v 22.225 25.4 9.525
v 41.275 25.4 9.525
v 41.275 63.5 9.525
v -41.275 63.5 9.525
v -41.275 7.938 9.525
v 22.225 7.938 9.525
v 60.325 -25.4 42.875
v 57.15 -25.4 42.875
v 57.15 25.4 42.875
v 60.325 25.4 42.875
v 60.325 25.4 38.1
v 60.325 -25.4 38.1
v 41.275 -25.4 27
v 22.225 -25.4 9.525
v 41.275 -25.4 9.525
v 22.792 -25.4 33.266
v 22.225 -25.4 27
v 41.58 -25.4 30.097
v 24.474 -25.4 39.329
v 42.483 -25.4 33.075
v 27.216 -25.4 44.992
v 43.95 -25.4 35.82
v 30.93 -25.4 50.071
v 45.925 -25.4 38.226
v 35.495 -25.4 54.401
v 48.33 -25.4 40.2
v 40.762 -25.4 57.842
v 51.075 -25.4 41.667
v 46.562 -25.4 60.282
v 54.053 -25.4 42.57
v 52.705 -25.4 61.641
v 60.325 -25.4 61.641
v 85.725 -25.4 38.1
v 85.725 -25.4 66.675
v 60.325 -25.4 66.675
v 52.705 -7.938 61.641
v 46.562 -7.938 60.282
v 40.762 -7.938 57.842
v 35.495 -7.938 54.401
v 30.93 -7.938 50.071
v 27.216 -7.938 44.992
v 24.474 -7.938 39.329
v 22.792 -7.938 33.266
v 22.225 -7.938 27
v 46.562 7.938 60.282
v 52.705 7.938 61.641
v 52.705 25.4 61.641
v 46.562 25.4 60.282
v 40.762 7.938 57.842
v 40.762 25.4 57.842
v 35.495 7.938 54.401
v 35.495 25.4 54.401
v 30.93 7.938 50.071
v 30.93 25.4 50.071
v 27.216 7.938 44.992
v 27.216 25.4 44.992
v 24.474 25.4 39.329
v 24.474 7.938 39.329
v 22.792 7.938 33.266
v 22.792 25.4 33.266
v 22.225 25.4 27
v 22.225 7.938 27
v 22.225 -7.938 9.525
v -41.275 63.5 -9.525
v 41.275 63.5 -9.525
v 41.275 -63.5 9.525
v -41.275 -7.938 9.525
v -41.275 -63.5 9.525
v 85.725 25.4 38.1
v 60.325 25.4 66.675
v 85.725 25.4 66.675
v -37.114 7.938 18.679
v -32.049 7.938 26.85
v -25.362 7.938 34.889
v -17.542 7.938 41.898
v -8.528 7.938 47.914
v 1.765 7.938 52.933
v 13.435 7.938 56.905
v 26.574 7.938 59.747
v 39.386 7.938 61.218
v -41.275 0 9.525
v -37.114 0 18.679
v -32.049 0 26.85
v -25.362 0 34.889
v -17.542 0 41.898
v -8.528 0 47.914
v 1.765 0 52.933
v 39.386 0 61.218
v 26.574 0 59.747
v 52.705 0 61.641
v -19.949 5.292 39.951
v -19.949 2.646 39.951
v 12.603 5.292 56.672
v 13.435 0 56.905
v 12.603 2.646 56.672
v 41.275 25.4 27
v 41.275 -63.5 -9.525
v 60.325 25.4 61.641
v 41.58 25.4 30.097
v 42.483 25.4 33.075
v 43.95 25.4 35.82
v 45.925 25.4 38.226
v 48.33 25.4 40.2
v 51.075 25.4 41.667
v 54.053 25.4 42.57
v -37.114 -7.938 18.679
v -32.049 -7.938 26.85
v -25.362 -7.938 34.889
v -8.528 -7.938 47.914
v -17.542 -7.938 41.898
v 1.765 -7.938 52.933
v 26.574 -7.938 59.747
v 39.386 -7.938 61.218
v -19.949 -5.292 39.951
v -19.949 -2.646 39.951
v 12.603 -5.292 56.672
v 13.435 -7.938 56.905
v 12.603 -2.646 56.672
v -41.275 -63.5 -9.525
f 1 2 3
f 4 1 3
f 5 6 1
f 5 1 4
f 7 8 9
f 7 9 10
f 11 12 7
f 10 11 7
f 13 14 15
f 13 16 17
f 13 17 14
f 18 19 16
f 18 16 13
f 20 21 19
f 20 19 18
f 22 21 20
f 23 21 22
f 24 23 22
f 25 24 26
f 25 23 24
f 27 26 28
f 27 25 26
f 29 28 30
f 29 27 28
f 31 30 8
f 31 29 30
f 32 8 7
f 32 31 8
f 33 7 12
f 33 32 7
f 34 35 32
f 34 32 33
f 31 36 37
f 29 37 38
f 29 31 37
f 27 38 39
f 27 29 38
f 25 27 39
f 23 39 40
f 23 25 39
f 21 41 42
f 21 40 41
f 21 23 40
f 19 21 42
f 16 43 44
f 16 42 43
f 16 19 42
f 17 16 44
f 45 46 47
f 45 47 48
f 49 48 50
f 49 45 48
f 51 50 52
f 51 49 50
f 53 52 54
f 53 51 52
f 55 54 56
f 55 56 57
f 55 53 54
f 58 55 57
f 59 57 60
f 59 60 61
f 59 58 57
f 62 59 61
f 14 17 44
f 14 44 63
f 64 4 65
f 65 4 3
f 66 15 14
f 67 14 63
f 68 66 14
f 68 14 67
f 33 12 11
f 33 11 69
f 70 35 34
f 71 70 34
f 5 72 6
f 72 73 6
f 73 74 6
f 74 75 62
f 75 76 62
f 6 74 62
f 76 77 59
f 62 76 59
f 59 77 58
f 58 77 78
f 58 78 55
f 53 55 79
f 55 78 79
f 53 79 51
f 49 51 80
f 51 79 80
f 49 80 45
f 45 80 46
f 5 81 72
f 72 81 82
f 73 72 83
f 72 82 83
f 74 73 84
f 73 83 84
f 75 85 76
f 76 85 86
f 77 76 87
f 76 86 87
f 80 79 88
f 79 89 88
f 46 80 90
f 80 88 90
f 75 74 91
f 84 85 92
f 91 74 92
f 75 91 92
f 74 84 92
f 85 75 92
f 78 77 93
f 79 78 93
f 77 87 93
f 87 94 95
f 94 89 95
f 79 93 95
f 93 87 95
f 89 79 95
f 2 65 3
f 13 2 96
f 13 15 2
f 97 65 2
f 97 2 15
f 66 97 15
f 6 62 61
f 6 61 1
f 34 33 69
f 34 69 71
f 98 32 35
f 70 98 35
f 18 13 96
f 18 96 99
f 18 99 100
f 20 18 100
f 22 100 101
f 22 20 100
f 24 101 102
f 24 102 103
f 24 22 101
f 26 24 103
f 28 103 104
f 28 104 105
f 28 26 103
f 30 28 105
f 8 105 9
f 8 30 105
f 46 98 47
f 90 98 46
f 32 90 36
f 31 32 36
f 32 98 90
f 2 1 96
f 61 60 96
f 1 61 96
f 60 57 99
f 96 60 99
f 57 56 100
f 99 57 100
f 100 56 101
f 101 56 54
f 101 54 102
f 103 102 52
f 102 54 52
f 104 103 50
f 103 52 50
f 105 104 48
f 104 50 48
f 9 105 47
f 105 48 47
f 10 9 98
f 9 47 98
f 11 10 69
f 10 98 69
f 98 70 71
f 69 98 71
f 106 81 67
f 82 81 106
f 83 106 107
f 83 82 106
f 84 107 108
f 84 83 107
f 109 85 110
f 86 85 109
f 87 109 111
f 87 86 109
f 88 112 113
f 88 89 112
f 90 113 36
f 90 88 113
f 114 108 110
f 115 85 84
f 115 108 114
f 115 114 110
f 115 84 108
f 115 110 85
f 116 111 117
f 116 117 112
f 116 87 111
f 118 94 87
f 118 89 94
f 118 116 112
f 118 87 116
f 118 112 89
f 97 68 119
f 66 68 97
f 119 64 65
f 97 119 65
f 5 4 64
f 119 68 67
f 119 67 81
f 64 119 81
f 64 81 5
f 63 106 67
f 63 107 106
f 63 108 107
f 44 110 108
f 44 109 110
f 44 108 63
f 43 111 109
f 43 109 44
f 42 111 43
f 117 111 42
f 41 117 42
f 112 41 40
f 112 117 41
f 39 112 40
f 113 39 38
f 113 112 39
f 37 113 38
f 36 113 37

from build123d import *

# Parameters (mm, degrees)
F1_DEPTH = 63.5
F0_W     = 25.4
F0_H     = 4.7752
F0_H_2   = 18.7659815103
F0_H_3   = 5.0338184897
F2_DEPTH = 25.4
F3_DEPTH = 7.9375


with BuildPart() as f1:
    # F0 (on Front) → F1 (new body, symmetric)
    with BuildSketch(Plane.XZ):
        Polygon((41.275, -9.525), (41.275, 9.525), (22.225, 9.525), (-41.275, 9.525), (-41.275, -9.525), align=None)
    extrude(amount=F1_DEPTH, both=True)

    # F0 (on Front) → F2 (join, symmetric)
    with BuildSketch(Plane.XZ):
        with BuildLine():
            Line((22.225, 9.525), (41.275, 9.525))
            Line((41.275, 9.525), (41.275, 27.0002))
            ThreePointArc((41.275, 27.0002), (45.9246798487, 38.2255201513), (57.15, 42.8752))
            Line((57.15, 42.8752), (60.325, 42.8752))
            Line((60.325, 42.8752), (60.325, 61.6411815103))
            Line((60.325, 61.6411815103), (52.705, 61.6411815103))
            ThreePointArc((52.705, 61.6411815103), (30.929805016, 50.0708956982), (22.225, 27.0002))
            Line((22.225, 27.0002), (22.225, 9.525))
        make_face()
        with Locations((73.025, 40.4876)):
            Rectangle(F0_W, F0_H)
        with Locations((73.025, 52.2581907552)):
            Rectangle(F0_W, F0_H_2)
        with Locations((73.025, 64.1580907552)):
            Rectangle(F0_W, F0_H_3)
    extrude(amount=F2_DEPTH, both=True)

    # F0 (on Front) → F3 (join, symmetric)
    with BuildSketch(Plane.XZ):
        with BuildLine():
            Line((-41.275, 9.525), (22.225, 9.525))
            Line((22.225, 9.525), (22.225, 27.0002))
            ThreePointArc((22.225, 27.0002), (30.929805016, 50.0708956982), (52.705, 61.6411815103))
            add(Edge.make_bspline(
                [(-41.275, 9.525), (-26.7878733575, 47.4557615817), (10.0529832694, 61.8960684807), (52.705, 61.6411815103)],
                knots=[0, 0, 0, 0, 107.4631880004, 107.4631880004, 107.4631880004, 107.4631880004], degree=3))
        make_face()
    extrude(amount=F3_DEPTH, both=True)


solid = f1.part
